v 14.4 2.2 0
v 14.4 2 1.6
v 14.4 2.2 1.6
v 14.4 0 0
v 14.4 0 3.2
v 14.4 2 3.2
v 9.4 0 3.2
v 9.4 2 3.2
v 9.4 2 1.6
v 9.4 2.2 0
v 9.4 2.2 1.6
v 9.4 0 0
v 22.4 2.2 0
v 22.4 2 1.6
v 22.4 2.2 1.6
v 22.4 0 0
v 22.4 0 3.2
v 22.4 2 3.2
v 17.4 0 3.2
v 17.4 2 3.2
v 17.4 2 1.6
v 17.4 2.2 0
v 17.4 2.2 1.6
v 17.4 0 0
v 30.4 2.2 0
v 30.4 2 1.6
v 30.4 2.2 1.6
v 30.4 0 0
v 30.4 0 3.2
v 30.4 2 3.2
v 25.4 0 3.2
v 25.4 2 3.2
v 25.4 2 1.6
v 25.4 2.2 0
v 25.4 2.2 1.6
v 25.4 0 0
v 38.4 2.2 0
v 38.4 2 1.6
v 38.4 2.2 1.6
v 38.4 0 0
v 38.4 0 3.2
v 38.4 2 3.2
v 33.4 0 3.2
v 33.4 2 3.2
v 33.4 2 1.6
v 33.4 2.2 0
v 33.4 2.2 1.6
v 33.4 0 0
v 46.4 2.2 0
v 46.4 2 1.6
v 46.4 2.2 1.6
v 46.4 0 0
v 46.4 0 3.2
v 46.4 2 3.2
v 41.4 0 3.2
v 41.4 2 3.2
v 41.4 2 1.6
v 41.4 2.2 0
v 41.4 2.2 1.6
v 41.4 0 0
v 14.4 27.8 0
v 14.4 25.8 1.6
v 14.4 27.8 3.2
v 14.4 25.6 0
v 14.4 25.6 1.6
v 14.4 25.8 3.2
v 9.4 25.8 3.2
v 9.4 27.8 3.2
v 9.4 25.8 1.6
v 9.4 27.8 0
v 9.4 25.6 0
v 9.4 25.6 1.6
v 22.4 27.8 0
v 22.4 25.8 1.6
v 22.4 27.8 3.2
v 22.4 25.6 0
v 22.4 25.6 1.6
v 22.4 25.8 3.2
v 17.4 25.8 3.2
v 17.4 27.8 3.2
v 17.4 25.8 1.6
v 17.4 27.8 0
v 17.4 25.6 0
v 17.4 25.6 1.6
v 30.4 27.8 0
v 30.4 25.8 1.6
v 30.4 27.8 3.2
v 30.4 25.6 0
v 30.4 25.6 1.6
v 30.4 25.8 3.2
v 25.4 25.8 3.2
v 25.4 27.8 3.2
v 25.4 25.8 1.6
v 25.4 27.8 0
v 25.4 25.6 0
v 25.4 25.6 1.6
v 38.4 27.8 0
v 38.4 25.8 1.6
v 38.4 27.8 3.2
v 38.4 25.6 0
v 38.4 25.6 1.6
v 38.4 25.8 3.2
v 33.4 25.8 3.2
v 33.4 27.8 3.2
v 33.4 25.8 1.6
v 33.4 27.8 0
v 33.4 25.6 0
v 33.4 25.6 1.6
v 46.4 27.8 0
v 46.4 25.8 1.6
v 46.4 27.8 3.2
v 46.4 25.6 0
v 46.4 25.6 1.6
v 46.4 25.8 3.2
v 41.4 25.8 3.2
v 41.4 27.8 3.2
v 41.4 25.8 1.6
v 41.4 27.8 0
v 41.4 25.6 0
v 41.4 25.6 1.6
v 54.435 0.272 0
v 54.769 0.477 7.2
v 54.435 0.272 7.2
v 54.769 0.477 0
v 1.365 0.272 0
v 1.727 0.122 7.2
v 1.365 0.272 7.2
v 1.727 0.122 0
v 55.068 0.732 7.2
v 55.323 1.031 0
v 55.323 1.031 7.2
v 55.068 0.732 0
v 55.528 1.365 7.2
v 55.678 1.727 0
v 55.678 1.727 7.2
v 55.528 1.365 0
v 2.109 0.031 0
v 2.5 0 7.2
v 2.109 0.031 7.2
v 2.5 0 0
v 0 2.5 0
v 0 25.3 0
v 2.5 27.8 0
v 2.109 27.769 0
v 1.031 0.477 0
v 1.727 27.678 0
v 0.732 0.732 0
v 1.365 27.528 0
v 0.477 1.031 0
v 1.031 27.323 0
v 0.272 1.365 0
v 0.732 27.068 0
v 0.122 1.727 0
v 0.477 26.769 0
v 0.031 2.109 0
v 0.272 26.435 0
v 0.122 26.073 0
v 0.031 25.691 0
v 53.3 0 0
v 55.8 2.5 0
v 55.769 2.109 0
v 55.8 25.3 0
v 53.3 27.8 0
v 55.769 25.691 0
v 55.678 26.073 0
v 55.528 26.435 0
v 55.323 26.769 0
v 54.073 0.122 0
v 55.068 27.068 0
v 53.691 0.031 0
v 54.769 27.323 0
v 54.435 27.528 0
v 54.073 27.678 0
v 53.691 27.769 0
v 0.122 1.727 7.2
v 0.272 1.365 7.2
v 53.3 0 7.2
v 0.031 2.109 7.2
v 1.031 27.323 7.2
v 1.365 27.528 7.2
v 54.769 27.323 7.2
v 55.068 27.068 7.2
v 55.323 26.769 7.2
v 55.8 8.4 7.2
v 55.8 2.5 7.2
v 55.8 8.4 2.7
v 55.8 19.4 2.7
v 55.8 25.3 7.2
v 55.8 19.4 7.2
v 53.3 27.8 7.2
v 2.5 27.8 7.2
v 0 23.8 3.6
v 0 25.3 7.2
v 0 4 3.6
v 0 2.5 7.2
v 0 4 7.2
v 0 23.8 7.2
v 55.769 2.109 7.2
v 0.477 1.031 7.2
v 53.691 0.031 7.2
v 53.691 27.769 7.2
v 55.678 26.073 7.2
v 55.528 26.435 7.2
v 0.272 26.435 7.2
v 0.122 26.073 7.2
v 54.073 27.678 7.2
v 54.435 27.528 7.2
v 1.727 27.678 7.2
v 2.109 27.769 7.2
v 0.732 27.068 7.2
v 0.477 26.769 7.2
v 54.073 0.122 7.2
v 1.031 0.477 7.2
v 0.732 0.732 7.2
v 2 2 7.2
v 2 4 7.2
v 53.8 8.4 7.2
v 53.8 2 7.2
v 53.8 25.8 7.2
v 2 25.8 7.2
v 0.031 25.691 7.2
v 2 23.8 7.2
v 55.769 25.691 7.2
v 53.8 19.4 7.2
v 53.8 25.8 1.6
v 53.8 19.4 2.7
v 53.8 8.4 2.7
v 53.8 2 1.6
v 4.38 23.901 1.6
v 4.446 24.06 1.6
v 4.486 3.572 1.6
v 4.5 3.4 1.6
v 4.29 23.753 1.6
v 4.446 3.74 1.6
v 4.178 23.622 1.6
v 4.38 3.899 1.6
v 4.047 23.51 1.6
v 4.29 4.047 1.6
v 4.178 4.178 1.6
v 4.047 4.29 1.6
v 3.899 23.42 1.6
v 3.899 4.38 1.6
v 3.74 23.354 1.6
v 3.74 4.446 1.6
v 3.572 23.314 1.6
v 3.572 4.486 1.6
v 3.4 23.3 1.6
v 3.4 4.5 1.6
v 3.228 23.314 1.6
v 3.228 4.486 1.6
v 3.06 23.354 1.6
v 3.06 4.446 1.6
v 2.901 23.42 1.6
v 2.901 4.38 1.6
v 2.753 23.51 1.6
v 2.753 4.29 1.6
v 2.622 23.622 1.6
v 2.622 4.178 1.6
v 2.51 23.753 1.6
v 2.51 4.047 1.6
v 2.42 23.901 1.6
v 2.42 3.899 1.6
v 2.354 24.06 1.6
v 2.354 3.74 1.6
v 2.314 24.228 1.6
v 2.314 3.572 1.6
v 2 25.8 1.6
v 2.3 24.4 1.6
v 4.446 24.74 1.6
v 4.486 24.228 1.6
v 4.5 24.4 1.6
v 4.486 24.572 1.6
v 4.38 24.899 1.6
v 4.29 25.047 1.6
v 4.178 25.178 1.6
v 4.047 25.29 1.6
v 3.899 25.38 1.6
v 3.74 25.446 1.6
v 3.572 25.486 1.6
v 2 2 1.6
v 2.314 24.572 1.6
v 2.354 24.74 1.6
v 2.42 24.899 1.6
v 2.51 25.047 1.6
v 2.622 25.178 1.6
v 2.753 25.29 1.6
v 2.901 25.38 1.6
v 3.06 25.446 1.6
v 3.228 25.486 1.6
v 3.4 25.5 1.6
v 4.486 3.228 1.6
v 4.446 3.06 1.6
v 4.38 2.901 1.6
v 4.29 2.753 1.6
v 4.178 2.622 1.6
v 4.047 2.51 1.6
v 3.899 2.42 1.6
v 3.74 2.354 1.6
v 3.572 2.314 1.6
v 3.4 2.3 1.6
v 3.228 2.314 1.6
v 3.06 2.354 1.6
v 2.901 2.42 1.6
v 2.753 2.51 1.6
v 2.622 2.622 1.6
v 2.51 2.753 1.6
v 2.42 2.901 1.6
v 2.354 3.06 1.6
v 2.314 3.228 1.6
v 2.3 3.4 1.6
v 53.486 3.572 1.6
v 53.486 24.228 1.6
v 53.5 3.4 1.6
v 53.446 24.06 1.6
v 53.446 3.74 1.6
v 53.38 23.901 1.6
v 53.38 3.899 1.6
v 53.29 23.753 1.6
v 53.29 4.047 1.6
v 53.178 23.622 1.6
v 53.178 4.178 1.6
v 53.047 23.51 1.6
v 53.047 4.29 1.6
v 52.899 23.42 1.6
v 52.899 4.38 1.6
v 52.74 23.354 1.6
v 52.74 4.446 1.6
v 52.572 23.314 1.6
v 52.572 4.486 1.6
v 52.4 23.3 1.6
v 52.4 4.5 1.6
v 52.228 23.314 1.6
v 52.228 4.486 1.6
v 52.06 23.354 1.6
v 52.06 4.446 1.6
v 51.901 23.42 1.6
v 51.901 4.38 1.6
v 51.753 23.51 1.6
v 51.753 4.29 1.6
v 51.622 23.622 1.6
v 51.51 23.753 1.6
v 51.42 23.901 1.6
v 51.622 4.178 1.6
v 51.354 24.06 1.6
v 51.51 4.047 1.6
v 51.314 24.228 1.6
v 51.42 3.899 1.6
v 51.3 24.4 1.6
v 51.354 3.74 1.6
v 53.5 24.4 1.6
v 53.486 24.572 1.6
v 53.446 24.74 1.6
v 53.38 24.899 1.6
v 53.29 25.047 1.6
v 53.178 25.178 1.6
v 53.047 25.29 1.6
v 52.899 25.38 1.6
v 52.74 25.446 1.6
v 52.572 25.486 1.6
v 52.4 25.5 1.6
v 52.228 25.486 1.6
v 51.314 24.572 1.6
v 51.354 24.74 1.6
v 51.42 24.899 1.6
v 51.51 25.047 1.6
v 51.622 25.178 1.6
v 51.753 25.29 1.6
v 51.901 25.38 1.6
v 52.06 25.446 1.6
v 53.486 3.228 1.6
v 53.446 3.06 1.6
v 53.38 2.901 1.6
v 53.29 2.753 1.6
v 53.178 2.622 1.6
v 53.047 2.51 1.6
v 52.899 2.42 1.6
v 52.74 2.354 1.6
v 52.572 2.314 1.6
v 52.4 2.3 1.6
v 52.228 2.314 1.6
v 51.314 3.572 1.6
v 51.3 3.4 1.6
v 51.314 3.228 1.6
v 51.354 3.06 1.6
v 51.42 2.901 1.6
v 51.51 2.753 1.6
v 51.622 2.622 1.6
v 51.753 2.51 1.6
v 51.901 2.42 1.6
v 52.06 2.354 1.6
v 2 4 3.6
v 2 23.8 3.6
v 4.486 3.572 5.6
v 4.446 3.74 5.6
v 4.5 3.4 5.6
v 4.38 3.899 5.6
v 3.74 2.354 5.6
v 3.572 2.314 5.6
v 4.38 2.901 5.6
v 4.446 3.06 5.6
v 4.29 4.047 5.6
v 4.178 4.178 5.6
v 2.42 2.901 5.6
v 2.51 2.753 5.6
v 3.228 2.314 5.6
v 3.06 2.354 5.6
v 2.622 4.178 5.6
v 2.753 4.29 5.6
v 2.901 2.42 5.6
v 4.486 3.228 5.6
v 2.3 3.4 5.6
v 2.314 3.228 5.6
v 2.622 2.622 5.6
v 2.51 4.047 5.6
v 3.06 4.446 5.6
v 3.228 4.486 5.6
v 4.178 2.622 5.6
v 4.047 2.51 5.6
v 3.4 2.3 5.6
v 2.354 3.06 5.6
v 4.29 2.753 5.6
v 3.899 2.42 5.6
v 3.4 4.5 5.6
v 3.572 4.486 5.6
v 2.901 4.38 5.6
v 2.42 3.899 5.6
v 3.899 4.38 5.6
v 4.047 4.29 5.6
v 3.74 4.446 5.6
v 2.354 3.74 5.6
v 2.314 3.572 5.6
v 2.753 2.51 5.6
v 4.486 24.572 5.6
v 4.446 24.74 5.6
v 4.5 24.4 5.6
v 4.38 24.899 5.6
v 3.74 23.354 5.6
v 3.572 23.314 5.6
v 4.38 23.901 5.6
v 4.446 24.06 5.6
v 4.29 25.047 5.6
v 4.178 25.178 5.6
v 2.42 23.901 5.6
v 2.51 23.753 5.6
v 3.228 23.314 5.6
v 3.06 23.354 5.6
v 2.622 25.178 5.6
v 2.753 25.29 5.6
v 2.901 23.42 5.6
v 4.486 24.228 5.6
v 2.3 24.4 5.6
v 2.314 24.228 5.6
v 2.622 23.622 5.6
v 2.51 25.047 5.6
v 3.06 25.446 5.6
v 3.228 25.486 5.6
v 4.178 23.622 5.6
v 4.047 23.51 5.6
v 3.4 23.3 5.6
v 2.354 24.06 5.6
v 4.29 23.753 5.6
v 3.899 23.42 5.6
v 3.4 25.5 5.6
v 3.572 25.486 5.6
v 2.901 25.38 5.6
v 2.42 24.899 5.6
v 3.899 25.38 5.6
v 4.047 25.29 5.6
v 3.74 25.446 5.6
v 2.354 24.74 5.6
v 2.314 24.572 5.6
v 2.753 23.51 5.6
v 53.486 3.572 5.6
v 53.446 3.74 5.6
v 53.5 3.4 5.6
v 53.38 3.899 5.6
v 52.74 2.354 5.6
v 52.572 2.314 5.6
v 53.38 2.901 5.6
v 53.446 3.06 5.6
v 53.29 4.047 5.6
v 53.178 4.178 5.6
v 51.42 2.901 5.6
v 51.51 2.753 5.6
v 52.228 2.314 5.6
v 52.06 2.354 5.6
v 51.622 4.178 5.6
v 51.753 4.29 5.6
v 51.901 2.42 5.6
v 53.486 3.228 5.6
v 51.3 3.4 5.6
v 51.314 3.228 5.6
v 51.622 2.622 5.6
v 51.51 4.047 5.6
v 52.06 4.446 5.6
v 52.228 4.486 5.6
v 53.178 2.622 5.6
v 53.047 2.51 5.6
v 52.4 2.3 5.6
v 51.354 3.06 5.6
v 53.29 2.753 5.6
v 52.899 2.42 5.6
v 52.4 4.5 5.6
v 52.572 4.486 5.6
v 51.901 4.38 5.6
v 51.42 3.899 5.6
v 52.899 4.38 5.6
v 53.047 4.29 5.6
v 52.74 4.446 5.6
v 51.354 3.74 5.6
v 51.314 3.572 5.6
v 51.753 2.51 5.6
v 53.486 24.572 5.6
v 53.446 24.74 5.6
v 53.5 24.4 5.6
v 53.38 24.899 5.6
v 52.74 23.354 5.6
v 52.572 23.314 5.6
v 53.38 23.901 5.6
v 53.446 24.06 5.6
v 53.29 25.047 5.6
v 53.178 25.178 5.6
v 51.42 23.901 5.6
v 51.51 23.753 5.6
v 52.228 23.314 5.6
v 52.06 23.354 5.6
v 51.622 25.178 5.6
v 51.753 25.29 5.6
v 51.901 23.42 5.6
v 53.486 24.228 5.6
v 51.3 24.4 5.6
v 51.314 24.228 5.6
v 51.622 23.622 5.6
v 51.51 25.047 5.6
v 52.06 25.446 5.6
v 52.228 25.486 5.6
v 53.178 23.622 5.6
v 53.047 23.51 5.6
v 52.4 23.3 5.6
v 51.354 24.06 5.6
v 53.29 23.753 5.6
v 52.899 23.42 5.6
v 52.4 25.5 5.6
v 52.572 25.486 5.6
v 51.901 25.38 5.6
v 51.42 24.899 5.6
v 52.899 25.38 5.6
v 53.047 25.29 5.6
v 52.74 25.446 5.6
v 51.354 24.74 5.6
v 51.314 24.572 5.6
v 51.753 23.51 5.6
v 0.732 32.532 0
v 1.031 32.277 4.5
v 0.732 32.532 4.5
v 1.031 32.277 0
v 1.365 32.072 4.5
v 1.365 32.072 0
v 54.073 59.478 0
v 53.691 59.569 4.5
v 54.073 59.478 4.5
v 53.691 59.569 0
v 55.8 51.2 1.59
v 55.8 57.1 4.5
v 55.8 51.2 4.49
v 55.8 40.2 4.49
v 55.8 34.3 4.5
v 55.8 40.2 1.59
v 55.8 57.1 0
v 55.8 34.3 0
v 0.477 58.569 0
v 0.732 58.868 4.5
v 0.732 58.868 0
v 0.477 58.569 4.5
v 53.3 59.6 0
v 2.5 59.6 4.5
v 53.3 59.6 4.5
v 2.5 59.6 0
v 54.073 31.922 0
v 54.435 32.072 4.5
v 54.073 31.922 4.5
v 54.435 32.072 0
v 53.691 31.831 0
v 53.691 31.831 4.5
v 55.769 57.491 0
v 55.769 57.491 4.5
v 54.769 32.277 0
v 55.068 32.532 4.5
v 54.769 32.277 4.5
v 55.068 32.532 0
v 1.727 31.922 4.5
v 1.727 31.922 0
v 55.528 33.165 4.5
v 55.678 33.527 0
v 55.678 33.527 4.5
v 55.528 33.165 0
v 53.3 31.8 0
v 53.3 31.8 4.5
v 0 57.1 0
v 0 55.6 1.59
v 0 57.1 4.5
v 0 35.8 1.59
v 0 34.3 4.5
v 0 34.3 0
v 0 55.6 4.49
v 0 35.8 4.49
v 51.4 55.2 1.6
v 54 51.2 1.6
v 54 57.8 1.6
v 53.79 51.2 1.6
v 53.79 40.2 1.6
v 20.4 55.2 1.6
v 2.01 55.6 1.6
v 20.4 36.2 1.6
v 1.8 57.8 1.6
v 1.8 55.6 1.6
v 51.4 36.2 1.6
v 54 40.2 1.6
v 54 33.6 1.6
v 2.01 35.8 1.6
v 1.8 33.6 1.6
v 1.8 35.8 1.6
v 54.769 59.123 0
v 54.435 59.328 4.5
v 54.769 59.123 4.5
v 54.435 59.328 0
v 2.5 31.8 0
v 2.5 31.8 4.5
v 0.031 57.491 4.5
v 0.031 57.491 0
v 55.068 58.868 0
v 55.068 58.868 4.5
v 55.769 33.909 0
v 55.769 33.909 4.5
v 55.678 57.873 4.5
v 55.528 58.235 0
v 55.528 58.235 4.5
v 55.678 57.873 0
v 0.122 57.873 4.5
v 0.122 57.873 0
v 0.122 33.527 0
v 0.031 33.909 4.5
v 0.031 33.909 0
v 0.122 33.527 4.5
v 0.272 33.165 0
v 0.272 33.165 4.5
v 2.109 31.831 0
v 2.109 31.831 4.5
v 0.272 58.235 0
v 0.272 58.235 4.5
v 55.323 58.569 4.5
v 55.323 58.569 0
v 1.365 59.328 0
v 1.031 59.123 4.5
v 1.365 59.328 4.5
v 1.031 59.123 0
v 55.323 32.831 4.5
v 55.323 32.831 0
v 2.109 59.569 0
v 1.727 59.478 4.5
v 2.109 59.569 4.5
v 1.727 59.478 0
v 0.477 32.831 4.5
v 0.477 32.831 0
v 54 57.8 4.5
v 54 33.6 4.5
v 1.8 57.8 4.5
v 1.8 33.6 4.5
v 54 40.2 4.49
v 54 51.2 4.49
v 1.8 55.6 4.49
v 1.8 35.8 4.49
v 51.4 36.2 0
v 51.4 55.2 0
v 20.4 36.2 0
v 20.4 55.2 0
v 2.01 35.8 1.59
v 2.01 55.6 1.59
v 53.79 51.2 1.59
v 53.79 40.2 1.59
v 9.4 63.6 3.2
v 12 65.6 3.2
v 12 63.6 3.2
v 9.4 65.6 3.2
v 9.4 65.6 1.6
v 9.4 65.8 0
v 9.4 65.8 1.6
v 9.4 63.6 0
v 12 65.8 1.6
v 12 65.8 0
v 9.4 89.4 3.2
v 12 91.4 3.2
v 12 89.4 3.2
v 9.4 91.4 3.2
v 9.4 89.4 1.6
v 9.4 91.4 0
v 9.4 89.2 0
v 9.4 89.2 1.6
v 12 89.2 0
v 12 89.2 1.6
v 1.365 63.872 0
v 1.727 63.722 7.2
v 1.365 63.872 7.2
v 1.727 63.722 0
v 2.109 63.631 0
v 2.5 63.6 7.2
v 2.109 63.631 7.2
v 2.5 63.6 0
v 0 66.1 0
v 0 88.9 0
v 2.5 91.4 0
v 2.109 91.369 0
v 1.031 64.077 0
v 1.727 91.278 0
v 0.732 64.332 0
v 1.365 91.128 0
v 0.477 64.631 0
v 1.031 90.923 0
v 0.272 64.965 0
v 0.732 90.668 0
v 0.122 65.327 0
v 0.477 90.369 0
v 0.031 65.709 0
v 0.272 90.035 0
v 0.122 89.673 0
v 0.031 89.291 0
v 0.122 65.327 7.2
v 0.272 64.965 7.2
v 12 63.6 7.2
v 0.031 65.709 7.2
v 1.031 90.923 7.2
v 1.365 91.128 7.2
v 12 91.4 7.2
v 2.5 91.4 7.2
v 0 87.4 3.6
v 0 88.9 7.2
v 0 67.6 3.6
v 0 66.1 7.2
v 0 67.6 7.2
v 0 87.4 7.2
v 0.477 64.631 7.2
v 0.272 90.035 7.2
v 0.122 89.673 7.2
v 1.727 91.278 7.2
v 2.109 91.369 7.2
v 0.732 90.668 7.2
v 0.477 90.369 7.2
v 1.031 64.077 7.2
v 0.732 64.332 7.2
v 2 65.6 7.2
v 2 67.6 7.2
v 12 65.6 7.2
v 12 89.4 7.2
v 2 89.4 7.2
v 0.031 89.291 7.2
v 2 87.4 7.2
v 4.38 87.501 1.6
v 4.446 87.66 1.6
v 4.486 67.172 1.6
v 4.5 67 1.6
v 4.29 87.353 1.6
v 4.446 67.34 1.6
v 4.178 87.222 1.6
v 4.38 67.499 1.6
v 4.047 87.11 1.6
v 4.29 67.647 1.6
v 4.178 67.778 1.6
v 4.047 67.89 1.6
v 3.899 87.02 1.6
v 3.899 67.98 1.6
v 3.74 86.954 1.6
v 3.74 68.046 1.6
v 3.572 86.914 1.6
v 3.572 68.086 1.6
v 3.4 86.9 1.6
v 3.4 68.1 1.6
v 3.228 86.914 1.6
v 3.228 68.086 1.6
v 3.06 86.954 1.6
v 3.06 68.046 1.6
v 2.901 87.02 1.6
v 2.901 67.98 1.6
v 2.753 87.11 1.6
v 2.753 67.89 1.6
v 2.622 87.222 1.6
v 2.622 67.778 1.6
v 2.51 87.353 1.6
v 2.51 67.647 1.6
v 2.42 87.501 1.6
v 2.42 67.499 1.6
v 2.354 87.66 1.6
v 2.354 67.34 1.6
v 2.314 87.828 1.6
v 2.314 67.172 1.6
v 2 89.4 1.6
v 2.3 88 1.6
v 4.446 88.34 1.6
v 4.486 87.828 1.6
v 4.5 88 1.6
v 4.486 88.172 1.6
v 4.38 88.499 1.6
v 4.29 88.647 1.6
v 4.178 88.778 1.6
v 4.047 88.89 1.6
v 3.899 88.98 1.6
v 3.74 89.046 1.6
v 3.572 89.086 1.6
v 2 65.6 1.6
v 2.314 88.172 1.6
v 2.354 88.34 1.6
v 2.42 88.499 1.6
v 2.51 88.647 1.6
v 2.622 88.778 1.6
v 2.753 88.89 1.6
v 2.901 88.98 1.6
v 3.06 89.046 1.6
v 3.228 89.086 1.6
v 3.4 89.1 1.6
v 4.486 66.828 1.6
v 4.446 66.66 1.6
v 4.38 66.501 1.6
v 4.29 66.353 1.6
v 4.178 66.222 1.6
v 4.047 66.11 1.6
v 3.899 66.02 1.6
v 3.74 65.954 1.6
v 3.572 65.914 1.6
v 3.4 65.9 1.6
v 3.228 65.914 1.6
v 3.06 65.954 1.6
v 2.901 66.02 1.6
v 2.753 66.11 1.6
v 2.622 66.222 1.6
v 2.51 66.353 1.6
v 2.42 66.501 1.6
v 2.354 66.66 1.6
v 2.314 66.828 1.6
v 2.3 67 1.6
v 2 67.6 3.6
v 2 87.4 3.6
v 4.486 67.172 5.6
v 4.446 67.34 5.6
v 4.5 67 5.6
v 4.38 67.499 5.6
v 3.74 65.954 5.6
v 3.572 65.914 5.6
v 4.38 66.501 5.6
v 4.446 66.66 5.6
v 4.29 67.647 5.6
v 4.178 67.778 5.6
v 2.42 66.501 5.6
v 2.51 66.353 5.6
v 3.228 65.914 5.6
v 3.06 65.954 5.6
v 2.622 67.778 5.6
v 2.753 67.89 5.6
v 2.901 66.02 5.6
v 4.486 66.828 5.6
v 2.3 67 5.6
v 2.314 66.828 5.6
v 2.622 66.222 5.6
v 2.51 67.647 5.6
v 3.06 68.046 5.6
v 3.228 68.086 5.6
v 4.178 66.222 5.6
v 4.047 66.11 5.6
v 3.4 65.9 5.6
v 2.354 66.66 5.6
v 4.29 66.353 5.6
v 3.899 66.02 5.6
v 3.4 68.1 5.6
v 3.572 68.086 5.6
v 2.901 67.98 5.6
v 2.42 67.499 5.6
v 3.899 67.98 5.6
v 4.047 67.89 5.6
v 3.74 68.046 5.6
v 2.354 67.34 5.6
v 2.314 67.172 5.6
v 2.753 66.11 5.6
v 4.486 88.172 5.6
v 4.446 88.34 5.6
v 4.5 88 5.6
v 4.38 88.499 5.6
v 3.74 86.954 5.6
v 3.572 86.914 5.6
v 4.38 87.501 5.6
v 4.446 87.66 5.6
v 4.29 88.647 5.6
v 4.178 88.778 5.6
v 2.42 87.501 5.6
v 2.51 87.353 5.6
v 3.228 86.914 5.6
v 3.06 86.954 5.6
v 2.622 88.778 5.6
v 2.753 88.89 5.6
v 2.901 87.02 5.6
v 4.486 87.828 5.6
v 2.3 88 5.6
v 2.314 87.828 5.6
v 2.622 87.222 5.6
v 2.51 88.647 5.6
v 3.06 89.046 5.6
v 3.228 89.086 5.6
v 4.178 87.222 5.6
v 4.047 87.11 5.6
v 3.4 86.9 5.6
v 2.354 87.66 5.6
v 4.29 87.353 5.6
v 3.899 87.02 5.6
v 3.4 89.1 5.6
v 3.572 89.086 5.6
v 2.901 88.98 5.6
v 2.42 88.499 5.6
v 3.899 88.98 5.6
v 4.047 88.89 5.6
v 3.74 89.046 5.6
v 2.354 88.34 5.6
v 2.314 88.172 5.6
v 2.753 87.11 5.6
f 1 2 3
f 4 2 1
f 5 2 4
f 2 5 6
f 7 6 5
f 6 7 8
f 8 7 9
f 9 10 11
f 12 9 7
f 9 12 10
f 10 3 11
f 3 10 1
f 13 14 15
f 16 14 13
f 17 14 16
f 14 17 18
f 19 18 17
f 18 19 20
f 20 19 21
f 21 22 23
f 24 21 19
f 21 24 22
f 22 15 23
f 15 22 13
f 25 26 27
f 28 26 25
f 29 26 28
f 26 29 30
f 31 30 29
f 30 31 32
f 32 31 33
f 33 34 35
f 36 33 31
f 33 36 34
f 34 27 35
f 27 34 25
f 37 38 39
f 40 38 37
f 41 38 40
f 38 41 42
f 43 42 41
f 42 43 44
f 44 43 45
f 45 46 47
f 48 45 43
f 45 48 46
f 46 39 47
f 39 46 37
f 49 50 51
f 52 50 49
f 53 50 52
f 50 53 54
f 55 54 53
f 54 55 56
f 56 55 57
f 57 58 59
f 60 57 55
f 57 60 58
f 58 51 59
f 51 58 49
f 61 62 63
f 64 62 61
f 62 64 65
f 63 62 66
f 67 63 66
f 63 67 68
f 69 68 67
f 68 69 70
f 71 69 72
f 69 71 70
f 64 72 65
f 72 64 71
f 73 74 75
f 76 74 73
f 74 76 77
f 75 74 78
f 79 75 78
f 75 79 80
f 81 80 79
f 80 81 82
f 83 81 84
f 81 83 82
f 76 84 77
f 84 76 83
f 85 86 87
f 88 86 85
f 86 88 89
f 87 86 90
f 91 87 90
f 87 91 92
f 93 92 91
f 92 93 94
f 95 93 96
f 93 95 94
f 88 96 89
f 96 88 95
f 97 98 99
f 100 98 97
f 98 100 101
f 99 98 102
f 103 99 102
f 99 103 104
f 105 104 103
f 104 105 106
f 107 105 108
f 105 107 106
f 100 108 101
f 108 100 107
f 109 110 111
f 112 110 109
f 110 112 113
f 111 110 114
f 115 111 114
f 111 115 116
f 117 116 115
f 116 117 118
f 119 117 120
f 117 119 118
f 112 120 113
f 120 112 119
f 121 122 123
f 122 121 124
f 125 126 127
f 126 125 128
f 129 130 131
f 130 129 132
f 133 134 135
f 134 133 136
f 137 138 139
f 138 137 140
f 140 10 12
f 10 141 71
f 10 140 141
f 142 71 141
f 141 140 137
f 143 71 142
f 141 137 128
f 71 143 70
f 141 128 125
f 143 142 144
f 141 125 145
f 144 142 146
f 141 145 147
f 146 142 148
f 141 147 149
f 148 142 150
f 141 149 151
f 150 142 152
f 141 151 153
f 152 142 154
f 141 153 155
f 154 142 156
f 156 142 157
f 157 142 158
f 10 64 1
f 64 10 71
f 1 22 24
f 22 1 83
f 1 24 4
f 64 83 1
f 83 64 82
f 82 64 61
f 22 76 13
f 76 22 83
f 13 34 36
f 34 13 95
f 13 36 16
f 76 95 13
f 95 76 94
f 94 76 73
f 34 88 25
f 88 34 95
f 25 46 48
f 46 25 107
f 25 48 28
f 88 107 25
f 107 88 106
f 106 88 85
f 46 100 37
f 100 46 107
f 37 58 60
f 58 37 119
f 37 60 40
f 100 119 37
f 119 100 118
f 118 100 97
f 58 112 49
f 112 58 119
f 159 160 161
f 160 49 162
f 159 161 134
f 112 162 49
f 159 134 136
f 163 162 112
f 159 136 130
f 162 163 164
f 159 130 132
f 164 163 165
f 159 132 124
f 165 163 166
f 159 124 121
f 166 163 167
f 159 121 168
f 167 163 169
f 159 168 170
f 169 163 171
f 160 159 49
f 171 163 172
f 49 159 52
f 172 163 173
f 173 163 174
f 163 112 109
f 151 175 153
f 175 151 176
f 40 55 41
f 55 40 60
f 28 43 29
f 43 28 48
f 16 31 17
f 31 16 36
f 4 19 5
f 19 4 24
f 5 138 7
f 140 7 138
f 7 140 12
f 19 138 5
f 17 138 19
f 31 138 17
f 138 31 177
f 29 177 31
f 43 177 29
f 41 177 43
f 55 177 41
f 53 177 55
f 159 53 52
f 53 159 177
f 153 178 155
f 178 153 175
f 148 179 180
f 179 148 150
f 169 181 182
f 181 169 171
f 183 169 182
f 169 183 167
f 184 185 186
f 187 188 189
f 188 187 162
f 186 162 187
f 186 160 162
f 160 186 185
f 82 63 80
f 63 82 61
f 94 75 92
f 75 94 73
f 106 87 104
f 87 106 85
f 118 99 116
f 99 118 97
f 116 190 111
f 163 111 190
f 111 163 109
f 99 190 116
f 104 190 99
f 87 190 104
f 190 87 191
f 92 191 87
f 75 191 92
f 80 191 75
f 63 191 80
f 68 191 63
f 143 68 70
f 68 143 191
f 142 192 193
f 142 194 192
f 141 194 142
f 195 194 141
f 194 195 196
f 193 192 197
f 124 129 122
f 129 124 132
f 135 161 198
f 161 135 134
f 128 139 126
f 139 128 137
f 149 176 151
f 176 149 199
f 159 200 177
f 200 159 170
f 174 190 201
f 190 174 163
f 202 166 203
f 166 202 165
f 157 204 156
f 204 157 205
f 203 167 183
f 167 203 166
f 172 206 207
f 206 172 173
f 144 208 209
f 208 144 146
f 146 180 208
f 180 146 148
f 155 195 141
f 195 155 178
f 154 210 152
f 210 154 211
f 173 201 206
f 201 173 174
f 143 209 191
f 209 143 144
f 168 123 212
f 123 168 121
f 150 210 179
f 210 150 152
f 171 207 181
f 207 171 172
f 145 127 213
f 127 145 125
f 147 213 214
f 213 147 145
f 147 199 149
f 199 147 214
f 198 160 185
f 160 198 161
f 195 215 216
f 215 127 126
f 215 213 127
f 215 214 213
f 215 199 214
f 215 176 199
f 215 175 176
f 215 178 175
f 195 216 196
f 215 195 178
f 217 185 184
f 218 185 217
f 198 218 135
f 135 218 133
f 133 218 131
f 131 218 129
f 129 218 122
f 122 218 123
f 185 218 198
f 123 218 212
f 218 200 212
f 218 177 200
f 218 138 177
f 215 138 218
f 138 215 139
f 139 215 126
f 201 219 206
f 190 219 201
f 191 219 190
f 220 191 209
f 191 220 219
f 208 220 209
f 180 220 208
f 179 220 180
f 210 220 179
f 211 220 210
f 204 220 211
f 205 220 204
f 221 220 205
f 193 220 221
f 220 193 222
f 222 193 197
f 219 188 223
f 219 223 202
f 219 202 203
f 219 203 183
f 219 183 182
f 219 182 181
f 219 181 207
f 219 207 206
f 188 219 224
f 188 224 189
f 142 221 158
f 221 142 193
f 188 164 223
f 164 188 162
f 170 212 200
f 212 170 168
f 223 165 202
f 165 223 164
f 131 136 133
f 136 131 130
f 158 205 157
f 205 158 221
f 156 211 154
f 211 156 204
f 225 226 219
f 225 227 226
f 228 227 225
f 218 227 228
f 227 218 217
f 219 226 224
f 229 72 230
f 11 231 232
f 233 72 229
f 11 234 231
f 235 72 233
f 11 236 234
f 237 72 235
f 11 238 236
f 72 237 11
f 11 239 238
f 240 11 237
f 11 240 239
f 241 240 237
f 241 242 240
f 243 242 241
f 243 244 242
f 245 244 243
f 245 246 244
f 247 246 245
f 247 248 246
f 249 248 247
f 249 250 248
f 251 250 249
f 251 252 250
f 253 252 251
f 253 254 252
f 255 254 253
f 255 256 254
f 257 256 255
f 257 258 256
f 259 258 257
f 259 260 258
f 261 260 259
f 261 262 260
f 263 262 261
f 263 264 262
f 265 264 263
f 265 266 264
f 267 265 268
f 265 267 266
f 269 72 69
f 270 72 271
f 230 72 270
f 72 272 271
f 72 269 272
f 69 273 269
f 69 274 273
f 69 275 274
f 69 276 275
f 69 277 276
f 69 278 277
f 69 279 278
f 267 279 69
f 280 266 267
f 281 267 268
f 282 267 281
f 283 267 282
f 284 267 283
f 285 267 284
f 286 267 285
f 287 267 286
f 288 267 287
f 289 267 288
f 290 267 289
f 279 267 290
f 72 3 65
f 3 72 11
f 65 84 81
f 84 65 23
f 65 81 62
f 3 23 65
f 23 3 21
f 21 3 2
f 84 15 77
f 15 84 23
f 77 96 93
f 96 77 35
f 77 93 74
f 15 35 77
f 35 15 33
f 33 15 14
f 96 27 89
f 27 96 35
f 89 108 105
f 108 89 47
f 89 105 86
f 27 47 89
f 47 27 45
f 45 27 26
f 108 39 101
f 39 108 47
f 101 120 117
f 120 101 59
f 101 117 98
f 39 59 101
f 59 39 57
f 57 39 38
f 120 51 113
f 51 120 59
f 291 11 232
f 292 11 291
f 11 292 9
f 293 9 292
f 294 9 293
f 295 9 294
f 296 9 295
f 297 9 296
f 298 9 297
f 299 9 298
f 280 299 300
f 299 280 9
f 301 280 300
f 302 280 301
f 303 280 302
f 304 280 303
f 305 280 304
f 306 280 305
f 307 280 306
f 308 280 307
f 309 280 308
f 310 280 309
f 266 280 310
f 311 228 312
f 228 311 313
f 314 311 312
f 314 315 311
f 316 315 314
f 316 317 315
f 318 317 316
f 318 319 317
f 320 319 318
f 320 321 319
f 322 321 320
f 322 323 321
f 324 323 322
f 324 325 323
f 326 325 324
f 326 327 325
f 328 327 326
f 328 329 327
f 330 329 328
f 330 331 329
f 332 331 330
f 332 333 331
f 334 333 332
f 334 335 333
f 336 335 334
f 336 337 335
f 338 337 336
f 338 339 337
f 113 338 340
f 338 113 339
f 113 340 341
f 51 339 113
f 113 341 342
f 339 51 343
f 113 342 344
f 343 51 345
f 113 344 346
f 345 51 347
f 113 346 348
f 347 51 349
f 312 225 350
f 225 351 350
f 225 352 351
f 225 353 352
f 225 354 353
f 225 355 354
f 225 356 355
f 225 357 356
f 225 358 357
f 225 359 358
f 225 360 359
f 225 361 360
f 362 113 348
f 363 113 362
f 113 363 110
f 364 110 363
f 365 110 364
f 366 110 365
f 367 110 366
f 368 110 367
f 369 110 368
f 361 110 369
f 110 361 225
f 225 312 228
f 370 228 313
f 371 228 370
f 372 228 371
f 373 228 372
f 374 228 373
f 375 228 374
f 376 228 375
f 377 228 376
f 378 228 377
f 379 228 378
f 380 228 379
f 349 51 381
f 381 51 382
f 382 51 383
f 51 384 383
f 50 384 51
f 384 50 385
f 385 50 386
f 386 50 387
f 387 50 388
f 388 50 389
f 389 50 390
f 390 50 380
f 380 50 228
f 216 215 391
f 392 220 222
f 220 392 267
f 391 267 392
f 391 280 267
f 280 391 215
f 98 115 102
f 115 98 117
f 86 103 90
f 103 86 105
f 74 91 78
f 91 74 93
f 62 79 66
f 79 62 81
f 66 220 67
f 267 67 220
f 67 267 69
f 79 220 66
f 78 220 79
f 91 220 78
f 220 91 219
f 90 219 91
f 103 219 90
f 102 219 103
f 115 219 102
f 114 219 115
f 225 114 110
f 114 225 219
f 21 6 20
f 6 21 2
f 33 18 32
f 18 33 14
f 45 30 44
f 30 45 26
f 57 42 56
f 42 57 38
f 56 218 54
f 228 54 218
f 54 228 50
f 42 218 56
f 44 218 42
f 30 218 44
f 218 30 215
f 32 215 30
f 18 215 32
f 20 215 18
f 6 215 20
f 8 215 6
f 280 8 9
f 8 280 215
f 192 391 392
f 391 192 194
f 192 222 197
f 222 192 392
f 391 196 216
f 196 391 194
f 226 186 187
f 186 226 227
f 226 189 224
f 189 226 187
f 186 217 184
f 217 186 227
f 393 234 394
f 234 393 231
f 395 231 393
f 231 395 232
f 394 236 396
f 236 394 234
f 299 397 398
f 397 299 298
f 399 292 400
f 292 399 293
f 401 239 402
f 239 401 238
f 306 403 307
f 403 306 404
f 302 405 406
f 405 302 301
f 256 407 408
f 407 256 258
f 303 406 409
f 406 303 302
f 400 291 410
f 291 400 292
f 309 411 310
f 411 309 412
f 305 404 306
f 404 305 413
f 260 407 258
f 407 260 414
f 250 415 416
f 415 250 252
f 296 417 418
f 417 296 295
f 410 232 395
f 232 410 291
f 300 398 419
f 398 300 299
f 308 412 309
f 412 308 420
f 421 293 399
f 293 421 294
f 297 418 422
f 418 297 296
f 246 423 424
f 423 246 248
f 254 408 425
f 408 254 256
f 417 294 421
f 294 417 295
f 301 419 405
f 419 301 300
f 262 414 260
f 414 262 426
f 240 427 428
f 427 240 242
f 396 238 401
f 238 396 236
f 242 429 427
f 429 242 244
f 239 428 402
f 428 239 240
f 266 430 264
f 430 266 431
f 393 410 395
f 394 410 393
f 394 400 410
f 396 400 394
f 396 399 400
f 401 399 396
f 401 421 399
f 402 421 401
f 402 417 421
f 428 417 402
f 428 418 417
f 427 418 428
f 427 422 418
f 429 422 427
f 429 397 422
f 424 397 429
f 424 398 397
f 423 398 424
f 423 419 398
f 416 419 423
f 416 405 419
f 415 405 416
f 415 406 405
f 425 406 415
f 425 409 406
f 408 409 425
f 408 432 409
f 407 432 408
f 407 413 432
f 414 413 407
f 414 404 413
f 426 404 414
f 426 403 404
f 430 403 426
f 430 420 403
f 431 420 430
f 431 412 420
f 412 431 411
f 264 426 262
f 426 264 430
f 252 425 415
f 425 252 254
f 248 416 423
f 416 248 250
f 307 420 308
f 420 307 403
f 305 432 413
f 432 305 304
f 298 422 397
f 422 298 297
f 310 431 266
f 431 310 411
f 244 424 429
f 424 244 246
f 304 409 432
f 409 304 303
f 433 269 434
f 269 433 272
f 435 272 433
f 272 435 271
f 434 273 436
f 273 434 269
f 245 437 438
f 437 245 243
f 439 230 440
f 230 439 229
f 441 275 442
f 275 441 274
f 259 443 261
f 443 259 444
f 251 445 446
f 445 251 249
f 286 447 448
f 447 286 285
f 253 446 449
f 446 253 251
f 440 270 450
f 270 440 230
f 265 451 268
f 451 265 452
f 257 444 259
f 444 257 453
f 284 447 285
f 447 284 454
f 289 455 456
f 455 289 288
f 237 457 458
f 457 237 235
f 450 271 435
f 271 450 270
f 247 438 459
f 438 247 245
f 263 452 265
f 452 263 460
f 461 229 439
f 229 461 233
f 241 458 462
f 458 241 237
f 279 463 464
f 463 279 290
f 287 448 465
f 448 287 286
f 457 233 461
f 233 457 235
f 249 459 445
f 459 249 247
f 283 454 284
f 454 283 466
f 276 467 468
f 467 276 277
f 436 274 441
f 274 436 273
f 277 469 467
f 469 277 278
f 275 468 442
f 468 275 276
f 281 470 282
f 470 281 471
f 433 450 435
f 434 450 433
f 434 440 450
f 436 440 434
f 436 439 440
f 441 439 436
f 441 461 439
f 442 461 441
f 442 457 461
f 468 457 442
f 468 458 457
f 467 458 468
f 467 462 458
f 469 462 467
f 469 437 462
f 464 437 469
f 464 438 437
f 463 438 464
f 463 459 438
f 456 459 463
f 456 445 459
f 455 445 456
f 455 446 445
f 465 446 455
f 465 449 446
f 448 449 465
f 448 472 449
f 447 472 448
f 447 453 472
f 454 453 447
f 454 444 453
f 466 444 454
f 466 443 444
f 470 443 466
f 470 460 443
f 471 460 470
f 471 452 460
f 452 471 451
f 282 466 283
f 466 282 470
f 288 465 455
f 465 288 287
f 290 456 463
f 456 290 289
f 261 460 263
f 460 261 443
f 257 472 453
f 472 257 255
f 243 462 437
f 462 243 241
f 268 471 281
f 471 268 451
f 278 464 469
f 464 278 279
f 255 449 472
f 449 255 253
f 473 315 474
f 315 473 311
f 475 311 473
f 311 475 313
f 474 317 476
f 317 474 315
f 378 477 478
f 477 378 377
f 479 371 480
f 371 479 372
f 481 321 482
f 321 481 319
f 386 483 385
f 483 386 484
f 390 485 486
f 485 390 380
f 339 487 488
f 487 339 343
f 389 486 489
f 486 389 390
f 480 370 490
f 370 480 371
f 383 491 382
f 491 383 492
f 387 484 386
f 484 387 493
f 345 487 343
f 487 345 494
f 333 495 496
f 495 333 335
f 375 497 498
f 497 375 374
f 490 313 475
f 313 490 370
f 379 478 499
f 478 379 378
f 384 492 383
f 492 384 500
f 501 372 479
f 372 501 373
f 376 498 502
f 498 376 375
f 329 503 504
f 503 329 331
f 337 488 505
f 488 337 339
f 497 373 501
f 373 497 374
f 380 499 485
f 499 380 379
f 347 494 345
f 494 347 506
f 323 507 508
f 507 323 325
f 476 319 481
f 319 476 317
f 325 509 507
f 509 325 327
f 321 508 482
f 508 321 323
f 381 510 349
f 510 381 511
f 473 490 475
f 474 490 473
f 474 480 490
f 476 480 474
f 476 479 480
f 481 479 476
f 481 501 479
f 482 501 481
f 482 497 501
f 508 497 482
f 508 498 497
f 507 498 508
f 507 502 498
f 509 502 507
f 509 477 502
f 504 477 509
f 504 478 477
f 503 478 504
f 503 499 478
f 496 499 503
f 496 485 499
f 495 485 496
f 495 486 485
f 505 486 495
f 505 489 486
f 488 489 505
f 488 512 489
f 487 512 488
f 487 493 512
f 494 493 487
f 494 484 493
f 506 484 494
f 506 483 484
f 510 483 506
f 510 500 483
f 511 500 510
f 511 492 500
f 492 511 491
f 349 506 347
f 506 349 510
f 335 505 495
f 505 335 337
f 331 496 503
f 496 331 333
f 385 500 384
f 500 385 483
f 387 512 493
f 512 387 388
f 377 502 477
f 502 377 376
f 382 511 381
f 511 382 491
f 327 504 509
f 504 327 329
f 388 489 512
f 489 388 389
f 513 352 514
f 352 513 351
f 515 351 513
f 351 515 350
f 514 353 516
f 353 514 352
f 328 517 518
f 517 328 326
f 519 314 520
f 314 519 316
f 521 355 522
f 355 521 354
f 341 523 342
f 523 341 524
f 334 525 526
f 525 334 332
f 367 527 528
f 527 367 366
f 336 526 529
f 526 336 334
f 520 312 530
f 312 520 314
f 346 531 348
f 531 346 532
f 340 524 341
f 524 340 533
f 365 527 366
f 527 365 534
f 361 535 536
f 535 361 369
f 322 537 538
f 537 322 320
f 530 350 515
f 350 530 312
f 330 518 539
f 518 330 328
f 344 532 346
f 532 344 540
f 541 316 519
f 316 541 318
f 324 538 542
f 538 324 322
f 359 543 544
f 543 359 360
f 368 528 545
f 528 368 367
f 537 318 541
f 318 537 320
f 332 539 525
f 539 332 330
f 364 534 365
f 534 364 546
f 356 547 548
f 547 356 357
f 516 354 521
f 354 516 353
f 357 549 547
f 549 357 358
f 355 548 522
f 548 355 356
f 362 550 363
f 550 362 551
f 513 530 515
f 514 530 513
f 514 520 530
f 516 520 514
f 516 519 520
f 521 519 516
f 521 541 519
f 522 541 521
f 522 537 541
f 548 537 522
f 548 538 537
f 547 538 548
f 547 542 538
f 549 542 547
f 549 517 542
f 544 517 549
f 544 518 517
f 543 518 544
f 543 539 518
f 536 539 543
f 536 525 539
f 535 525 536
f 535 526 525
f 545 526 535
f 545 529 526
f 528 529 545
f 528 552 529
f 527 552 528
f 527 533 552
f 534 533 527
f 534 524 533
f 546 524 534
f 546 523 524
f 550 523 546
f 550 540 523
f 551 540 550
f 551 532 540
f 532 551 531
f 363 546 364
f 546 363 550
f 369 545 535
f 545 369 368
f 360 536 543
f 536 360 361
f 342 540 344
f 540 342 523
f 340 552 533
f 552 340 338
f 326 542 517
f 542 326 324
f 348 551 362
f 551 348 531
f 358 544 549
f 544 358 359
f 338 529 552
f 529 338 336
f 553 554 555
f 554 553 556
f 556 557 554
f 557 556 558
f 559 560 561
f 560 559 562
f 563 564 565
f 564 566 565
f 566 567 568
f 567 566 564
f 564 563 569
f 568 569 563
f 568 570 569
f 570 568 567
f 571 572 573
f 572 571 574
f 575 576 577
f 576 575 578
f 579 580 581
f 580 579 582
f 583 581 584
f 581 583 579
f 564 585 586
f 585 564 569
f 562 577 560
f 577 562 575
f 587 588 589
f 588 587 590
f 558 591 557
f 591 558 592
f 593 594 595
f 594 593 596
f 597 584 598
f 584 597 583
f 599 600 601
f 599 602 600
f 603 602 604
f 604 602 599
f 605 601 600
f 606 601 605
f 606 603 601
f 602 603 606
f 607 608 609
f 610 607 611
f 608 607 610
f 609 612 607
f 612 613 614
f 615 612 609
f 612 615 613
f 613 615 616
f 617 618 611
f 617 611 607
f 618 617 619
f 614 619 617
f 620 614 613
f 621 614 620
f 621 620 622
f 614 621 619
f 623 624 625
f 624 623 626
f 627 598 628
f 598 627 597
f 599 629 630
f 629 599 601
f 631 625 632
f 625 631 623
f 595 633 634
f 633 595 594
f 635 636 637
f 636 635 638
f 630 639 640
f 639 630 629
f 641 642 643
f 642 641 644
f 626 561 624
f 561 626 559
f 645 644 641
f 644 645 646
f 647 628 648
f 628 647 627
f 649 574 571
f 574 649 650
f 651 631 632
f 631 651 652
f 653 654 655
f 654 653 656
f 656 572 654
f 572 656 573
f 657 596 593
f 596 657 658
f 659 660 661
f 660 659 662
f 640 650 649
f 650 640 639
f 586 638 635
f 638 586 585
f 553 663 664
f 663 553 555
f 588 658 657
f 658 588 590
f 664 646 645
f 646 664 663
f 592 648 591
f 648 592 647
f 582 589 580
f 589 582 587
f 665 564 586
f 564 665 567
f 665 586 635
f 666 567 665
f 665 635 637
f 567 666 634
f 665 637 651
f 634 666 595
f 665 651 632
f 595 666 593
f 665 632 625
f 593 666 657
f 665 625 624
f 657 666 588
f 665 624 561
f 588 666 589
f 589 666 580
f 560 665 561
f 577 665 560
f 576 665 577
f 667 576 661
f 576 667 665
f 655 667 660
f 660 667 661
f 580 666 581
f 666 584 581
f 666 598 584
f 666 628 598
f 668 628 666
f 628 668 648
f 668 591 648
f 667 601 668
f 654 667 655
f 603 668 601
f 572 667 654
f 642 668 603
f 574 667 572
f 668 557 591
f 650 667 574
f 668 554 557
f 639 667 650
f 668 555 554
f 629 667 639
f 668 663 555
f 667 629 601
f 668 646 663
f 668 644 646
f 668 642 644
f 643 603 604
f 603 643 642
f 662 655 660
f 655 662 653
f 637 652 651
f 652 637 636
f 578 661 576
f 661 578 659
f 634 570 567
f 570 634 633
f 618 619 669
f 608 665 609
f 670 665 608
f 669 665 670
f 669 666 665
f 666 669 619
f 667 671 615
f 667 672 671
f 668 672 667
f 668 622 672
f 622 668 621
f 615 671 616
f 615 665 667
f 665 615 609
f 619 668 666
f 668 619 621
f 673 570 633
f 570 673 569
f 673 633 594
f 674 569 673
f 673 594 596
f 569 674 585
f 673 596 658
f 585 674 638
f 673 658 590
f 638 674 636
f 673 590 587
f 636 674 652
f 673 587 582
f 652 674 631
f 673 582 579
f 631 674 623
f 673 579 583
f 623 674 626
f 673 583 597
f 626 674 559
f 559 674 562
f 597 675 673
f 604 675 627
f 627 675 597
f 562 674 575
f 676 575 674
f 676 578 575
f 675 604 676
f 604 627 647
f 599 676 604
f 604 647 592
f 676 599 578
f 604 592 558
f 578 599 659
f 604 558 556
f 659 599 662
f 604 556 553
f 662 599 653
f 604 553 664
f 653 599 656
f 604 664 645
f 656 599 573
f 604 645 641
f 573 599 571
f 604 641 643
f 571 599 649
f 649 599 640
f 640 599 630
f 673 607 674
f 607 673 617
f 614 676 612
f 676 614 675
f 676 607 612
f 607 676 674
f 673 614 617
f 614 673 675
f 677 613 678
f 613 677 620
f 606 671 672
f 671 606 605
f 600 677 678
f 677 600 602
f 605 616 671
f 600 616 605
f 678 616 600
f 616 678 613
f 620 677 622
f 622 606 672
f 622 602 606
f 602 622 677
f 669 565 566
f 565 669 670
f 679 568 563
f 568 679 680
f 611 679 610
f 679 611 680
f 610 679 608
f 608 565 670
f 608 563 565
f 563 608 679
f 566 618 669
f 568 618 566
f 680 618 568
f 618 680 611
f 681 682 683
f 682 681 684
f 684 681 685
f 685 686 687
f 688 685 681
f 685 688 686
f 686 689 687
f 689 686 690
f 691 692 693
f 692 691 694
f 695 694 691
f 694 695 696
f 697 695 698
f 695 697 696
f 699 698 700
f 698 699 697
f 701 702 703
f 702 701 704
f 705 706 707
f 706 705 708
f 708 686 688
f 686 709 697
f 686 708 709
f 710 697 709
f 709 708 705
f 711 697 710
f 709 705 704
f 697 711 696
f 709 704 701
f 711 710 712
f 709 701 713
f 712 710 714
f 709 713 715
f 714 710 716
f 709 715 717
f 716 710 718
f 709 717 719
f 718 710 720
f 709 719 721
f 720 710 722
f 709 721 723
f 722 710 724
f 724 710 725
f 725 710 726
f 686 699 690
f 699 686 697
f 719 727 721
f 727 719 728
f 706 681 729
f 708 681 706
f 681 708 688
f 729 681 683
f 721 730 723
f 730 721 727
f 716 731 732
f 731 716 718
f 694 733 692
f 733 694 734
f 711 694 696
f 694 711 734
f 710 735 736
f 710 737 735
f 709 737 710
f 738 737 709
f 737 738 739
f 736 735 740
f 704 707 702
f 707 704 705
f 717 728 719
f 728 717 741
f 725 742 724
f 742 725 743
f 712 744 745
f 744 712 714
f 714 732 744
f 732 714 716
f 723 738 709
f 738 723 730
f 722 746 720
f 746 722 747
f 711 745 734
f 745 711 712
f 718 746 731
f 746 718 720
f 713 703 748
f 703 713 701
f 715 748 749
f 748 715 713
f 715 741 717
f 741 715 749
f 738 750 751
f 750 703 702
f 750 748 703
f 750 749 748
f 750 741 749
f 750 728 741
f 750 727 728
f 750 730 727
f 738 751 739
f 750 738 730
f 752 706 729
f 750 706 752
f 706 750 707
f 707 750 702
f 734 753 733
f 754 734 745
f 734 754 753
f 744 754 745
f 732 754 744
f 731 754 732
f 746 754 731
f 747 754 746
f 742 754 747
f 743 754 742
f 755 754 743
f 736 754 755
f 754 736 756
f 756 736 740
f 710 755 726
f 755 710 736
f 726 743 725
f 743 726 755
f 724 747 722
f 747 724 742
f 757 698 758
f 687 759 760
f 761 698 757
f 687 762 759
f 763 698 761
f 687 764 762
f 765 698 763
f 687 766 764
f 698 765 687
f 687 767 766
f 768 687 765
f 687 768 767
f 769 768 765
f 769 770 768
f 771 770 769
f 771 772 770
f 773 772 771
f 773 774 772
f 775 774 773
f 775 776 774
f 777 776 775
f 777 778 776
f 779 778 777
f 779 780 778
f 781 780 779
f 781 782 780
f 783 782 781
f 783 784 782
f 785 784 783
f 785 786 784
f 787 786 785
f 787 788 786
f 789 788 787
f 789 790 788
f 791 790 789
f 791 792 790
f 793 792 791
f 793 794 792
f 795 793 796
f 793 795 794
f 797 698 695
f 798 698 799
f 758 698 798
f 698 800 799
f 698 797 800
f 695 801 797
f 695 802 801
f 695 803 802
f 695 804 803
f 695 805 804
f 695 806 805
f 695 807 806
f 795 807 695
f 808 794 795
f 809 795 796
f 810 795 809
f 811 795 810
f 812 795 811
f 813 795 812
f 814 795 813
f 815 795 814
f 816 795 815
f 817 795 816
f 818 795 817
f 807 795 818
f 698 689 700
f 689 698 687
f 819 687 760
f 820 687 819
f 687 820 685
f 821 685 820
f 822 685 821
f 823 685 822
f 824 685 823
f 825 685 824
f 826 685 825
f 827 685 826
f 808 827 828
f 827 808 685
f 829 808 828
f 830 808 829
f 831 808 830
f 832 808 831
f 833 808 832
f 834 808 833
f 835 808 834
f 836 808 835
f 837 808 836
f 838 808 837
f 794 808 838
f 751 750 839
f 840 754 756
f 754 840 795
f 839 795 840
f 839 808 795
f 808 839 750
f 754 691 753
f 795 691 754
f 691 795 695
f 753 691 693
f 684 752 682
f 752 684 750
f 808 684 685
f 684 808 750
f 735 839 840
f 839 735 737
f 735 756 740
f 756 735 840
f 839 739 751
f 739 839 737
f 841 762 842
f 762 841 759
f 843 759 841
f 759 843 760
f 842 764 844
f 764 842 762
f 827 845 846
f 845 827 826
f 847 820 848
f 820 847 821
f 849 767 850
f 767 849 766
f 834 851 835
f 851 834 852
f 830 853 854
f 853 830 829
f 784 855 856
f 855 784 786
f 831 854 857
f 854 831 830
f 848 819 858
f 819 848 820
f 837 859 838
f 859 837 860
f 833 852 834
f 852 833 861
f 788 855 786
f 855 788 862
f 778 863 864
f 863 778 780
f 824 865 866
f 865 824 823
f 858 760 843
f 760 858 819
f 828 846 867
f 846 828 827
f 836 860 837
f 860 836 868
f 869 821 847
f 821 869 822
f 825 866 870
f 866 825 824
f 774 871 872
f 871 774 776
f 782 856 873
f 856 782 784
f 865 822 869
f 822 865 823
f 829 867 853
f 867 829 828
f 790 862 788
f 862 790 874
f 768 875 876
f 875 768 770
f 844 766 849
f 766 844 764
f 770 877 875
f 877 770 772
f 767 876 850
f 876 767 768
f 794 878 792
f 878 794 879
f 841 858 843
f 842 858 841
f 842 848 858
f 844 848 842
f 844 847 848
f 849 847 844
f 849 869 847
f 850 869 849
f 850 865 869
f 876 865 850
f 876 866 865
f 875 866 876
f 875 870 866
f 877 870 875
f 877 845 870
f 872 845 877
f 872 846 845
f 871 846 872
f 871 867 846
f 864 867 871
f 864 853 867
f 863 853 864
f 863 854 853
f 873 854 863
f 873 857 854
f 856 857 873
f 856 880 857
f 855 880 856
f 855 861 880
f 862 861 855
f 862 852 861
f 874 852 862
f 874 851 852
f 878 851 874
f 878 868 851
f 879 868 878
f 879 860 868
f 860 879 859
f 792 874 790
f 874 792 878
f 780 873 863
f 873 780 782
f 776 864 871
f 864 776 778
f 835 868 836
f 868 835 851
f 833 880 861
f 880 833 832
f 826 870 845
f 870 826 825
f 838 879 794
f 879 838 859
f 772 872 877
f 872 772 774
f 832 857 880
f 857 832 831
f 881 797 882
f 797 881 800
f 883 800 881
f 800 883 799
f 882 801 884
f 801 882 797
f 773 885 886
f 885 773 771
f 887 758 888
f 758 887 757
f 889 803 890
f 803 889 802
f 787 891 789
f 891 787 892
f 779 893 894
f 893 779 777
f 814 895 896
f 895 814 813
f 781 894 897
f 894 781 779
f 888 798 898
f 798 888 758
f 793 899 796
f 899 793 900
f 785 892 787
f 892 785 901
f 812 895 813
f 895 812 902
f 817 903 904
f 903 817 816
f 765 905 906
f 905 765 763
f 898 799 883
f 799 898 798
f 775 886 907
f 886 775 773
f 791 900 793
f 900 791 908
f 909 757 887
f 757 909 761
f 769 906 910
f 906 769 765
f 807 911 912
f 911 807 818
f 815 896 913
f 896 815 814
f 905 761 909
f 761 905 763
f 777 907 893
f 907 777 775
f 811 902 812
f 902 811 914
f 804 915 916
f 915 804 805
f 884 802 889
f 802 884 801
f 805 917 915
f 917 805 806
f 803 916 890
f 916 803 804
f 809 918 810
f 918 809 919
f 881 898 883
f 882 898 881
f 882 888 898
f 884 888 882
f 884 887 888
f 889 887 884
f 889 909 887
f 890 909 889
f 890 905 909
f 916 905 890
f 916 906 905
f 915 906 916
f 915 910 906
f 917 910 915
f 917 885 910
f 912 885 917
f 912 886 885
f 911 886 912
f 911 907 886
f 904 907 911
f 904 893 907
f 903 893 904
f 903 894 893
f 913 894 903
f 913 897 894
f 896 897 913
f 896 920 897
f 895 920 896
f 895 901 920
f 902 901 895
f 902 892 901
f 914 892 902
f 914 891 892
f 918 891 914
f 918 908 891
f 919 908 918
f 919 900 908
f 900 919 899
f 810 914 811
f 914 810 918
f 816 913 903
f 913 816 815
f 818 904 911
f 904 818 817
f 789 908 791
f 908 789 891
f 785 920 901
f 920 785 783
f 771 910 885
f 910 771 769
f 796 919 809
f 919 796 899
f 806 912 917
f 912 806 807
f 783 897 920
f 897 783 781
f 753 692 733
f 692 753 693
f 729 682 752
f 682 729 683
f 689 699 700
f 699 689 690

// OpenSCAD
// Tank Monitor enclosure -- LAFVIN ESP32-C6 1.47" LCD board
//
// LAFVIN publishes no mechanical drawing and the Waveshare-outline cases
// do not fit this board, so these dimensions come from photographs and
// are good to roughly +/-1mm. The design is built to tolerate that:
//
//   * USB-C is a full-width slot, not a shaped port -- nothing to misalign
//   * the LCD window is cut inside the glass edge, so the bezel hides error
//   * BOOT/RESET get no holes at all (see note below)
//
// Before printing the whole thing, set part="fittest" and print that. It
// is a 10mm slice of the pocket and the USB end -- about 3 minutes -- and
// tells you whether pcb_l/pcb_w/depth are right.

part = "all";   // "all" | "tray" | "lid" | "fittest"

/* [BOARD -- replace with caliper readings if you get them] */
pcb_l = 51.0;     // long dimension, USB end to far end
pcb_w = 23.0;     // short dimension
pcb_t = 1.6;      // bare PCB thickness

back_h  = 4.0;    // tallest component on the BACK
front_h = 2.5;    // glass + ribbon height above the PCB front

// The glass runs from the far end back toward the USB end and is very
// nearly the full board width.
lcd_l      = 33.0;   // glass length along pcb_l
lcd_w      = 21.0;   // glass width along pcb_w
lcd_gap    = 1.0;    // glass inset from the FAR end
lcd_off_w  = 1.0;    // glass inset from one long edge

/* [FIT] */
clearance = 0.4;    // per side around the PCB
wall      = 2.0;
floor_t   = 1.6;
bezel_t   = 1.6;
overlap   = 1.0;    // how far the bezel laps over the glass

/* [CABLE EXIT] */
// Eight wires leave this board. No stock case allows for that.
cable_w = 11.0;
cable_h = 4.5;

eps = 0.01;
$fn = 40;

// ---- derived ----------------------------------------------------------
in_l   = pcb_l + 2 * clearance;
in_w   = pcb_w + 2 * clearance;
out_l  = in_l + 2 * wall;
out_w  = in_w + 2 * wall;
tray_h = floor_t + back_h + pcb_t;
skirt  = front_h + 0.4;

module rrect(l, w, h, r = 2.5) {
  hull() for (x = [r, l - r], y = [r, w - r]) translate([x, y, 0]) cylinder(r = r, h = h);
}

// USB end is at x = 0. Full-width slot: no alignment to get wrong.
module usb_slot() {
  translate([-eps, wall + 2, floor_t + back_h + pcb_t - 3.6])
    cube([wall + 2 * eps, in_w - 4, 3.8]);
}

module cable_slot() {
  translate([out_l - wall - eps, (out_w - cable_w) / 2, tray_h - cable_h])
    cube([wall + 2 * eps, cable_w, cable_h + eps]);
}

module tray() {
  difference() {
    rrect(out_l, out_w, tray_h);
    translate([wall, wall, floor_t]) cube([in_l, in_w, tray_h]);
    usb_slot();
    cable_slot();
    // Vents -- this hangs above a warm, humid tank
    for (i = [-1, 1], j = [0 : 4])
      translate([out_l / 2 - 16 + j * 8,
                 out_w / 2 + i * (out_w / 2 - wall / 2), floor_t / 2])
        cube([5, 2.4, floor_t * 3], center = true);
  }
  // Posts that stop the board sliding, all below board level
  for (x = [wall + 1.4, out_l - wall - 1.4], y = [wall + 1.4, out_w - wall - 1.4])
    translate([x, y, floor_t]) cylinder(r = 1.1, h = back_h);
}

module lid() {
  // Window sits INSIDE the glass by `overlap` on every side, so a 1mm
  // error in the glass position is still covered by bezel.
  win_l = lcd_l - 2 * overlap;
  win_w = lcd_w - 2 * overlap;
  win_x = wall + clearance + (pcb_l - lcd_gap - lcd_l) + overlap;
  win_y = wall + clearance + lcd_off_w + overlap;

  difference() {
    union() {
      rrect(out_l, out_w, bezel_t);
      difference() {
        translate([0, 0, bezel_t]) rrect(out_l, out_w, skirt);
        translate([wall - 0.2, wall - 0.2, bezel_t - eps])
          cube([in_l + 0.4, in_w + 0.4, skirt + 2 * eps]);
      }
    }
    translate([win_x, win_y, -eps]) cube([win_l, win_w, bezel_t + 2 * eps]);
    // The USB slot continues through the skirt
    translate([-eps, wall + 2, bezel_t - eps]) cube([wall + 2 * eps, in_w - 4, skirt]);
    translate([out_l - wall - eps, (out_w - cable_w) / 2, bezel_t - eps])
      cube([wall + 2 * eps, cable_w, skirt]);
  }
}

// A 10mm slice through the USB end. Print this first.
module fittest() {
  intersection() {
    tray();
    cube([12, out_w, tray_h]);
  }
}

if (part == "tray") tray();
else if (part == "lid") lid();
else if (part == "fittest") fittest();
else {
  tray();
  translate([0, out_w + 4, 0]) lid();
  translate([0, 2 * out_w + 8, 0]) fittest();
}
